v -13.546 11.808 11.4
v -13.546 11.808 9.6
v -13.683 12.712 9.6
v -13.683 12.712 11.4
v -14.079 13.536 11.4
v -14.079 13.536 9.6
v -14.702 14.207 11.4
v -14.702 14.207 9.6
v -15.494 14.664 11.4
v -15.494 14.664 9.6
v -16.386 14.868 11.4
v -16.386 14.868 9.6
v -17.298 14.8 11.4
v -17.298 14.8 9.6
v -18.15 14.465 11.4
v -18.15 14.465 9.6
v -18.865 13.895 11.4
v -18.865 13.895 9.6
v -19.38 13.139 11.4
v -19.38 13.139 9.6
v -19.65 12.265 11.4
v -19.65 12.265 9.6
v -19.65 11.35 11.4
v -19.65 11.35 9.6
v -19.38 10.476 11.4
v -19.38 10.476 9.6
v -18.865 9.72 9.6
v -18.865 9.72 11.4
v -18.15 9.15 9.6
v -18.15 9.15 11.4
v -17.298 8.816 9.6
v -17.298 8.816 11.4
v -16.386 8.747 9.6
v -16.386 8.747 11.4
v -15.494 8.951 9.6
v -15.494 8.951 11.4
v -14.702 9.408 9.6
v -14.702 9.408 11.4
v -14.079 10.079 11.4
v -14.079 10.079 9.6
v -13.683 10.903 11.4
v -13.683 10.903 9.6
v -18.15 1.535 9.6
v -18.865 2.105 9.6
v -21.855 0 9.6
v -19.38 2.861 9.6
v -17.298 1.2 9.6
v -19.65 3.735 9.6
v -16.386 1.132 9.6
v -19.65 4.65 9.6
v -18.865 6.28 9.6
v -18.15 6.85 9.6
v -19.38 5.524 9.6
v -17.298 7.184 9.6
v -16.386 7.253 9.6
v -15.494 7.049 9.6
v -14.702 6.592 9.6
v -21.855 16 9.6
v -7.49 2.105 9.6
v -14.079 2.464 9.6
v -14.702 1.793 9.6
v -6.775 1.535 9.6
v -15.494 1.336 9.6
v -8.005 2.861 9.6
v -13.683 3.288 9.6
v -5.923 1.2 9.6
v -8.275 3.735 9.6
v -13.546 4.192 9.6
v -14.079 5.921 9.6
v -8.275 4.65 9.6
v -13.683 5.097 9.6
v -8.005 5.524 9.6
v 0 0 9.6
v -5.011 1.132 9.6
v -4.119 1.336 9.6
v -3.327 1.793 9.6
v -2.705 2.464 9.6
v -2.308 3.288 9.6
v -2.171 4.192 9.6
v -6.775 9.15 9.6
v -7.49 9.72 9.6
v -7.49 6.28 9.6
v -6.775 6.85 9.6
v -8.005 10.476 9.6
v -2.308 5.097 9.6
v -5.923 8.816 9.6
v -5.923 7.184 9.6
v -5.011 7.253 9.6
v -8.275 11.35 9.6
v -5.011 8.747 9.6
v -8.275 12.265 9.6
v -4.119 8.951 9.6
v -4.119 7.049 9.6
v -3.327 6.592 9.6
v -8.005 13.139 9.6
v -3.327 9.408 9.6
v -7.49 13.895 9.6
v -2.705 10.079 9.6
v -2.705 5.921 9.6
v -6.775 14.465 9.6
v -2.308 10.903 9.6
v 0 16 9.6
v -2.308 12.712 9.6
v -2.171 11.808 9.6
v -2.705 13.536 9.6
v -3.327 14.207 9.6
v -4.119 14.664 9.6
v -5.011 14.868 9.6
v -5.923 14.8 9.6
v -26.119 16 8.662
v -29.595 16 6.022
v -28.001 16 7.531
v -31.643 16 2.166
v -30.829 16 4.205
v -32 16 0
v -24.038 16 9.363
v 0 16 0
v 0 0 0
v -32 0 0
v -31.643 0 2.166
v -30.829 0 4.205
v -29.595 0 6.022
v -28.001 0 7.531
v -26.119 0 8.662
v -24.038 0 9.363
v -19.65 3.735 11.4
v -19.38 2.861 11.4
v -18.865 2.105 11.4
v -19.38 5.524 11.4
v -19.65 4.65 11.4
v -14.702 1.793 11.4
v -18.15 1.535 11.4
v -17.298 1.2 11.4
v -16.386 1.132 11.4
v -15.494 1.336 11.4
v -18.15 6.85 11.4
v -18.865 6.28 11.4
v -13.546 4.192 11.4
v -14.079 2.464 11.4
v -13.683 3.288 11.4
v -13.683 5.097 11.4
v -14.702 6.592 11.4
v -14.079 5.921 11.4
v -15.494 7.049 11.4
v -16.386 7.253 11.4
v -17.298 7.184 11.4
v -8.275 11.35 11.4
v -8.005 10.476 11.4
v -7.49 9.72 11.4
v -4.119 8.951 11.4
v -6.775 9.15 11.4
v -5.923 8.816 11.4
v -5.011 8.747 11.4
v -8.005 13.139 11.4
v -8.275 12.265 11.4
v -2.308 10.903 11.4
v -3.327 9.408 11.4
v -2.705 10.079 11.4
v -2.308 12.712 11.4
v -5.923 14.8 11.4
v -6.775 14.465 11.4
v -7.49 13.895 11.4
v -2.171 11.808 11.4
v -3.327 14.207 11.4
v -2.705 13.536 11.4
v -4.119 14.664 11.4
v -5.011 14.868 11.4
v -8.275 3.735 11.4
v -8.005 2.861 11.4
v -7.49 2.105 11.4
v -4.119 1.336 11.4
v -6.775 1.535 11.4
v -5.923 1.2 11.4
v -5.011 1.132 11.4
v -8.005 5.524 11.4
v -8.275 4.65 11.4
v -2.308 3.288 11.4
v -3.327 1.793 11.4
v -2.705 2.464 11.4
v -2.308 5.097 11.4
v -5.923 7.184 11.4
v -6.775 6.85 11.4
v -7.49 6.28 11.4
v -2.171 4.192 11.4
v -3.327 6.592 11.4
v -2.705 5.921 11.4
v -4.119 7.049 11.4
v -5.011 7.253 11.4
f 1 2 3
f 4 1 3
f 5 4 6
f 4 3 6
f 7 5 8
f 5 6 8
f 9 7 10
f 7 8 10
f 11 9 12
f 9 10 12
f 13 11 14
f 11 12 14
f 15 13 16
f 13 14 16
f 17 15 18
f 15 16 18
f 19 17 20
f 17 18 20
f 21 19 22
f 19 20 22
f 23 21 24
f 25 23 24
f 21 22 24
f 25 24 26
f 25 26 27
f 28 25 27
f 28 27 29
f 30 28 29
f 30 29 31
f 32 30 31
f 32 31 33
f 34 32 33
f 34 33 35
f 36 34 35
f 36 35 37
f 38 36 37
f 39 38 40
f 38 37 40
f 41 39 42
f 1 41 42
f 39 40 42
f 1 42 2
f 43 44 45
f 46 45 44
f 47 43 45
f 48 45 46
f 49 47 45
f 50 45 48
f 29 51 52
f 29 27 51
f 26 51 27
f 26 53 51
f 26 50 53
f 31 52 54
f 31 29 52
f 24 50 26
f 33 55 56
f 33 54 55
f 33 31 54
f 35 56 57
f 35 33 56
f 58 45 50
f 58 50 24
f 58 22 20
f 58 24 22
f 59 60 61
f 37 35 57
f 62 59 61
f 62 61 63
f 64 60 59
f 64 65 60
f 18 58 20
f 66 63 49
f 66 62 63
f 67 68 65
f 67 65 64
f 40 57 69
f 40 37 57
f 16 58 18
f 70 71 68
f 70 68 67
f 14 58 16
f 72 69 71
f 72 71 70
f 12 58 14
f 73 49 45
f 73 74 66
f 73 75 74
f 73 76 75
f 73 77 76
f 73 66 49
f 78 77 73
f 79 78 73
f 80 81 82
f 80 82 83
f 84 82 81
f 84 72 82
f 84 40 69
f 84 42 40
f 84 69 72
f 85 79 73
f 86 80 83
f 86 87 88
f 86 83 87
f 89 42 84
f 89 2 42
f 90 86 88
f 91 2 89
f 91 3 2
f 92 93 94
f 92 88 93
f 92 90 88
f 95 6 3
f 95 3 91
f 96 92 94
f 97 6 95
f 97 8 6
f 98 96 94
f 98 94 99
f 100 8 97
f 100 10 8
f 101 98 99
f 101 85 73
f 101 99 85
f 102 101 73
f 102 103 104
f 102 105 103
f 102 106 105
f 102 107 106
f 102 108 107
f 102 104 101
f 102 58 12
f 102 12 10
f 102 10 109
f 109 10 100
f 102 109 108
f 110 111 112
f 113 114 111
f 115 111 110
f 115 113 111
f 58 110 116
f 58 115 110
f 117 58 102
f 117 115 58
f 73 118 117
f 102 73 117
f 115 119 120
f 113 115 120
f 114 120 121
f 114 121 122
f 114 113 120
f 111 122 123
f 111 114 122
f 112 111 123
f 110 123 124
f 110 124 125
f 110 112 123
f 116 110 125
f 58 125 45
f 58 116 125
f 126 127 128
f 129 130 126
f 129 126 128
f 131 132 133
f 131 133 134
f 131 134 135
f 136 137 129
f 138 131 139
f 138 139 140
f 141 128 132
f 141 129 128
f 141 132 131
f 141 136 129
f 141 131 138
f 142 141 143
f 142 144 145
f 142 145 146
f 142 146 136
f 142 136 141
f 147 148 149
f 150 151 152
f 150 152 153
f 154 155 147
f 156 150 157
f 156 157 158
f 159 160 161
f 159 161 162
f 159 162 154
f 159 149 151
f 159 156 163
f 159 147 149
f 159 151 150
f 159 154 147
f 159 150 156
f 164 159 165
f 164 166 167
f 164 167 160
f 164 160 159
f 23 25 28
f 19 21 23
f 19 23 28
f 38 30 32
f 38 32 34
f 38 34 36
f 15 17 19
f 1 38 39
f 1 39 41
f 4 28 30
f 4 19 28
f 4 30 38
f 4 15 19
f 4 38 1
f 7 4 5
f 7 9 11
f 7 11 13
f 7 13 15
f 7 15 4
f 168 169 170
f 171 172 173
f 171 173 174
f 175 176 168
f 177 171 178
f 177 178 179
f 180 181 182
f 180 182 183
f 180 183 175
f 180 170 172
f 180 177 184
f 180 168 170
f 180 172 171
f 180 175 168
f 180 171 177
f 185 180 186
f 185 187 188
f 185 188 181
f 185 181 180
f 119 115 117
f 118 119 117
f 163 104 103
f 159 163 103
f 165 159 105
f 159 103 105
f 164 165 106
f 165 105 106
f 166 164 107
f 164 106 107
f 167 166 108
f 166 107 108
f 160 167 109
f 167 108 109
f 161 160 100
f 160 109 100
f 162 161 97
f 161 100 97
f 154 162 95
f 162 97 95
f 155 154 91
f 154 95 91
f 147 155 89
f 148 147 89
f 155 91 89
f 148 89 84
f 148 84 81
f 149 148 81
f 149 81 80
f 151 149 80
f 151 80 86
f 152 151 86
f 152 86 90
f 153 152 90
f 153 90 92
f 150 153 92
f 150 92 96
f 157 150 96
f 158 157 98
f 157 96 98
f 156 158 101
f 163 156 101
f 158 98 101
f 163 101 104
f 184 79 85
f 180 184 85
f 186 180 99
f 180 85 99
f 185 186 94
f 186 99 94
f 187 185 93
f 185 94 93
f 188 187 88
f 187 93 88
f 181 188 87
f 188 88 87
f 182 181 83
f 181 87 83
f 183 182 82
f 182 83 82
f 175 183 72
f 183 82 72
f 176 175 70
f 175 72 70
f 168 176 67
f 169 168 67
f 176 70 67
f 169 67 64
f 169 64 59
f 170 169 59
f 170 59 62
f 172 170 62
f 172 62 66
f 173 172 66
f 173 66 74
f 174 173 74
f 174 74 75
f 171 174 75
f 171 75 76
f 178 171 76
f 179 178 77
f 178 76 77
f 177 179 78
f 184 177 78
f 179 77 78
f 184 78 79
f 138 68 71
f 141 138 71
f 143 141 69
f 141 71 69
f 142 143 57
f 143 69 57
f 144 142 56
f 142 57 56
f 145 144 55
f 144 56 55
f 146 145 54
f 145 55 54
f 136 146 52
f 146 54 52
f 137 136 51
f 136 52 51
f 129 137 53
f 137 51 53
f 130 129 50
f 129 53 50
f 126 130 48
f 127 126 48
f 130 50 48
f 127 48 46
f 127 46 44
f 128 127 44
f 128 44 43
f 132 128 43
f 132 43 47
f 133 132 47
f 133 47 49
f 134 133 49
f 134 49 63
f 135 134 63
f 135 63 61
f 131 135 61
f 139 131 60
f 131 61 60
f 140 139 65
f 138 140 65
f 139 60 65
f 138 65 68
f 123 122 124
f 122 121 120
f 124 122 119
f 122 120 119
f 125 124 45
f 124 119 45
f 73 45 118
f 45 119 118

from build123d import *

# Parameters (mm, degrees)
F0_W        = 32
F0_H        = 16
F1_DEPTH    = 9.6
F2_T1_DEPTH = 66.7227759493
F3_R        = 3.0688775333
F4_DEPTH    = 1.8


# Not quite as in the source:
# - a fillet or chamfer that OpenCascade refuses, or shapes differently, is made with other operations: its cross-section is extruded or revolved along the edge and cut away or added
# - a feature names something its author has since deleted; it is built from what else it names


with BuildPart() as f1:
    # F0 (on Top) → F1 (new body)
    with BuildSketch(Plane.XY):
        with Locations((-16, 8)):
            Rectangle(F0_W, F0_H)
    extrude(amount=F1_DEPTH)

    # F2: fillet of radius 10.16 on 1 edges, made by hand

    # F2_s2 → F2_t1 (cut)
    with BuildSketch(Plane.XZ.offset(-41.3613879746)):
        with BuildLine():
            ThreePointArc((-32, 0), (-28.8388537198, 6.819539281), (-21.8554448101, 9.6))
            Line((-21.8554448101, 9.6), (-32, 9.6))
            Line((-32, 9.6), (-32, 0))
        make_face()
    extrude(amount=F2_T1_DEPTH, mode=Mode.SUBTRACT)

    # F3 (on face) → F4 (join)
    with BuildSketch(Plane.XY.offset(9.6)):
        with Locations((-16.6150905888, 11.8076978251)):
            Circle(F3_R)
        with Locations((-5.2403542213, 11.8076978251)):
            Circle(F3_R)
        with Locations((-16.6150905888, 4.1923021749)):
            Circle(F3_R)
        with Locations((-5.2403542213, 4.1923021749)):
            Circle(F3_R)
    extrude(amount=F4_DEPTH)


solid = f1.part
